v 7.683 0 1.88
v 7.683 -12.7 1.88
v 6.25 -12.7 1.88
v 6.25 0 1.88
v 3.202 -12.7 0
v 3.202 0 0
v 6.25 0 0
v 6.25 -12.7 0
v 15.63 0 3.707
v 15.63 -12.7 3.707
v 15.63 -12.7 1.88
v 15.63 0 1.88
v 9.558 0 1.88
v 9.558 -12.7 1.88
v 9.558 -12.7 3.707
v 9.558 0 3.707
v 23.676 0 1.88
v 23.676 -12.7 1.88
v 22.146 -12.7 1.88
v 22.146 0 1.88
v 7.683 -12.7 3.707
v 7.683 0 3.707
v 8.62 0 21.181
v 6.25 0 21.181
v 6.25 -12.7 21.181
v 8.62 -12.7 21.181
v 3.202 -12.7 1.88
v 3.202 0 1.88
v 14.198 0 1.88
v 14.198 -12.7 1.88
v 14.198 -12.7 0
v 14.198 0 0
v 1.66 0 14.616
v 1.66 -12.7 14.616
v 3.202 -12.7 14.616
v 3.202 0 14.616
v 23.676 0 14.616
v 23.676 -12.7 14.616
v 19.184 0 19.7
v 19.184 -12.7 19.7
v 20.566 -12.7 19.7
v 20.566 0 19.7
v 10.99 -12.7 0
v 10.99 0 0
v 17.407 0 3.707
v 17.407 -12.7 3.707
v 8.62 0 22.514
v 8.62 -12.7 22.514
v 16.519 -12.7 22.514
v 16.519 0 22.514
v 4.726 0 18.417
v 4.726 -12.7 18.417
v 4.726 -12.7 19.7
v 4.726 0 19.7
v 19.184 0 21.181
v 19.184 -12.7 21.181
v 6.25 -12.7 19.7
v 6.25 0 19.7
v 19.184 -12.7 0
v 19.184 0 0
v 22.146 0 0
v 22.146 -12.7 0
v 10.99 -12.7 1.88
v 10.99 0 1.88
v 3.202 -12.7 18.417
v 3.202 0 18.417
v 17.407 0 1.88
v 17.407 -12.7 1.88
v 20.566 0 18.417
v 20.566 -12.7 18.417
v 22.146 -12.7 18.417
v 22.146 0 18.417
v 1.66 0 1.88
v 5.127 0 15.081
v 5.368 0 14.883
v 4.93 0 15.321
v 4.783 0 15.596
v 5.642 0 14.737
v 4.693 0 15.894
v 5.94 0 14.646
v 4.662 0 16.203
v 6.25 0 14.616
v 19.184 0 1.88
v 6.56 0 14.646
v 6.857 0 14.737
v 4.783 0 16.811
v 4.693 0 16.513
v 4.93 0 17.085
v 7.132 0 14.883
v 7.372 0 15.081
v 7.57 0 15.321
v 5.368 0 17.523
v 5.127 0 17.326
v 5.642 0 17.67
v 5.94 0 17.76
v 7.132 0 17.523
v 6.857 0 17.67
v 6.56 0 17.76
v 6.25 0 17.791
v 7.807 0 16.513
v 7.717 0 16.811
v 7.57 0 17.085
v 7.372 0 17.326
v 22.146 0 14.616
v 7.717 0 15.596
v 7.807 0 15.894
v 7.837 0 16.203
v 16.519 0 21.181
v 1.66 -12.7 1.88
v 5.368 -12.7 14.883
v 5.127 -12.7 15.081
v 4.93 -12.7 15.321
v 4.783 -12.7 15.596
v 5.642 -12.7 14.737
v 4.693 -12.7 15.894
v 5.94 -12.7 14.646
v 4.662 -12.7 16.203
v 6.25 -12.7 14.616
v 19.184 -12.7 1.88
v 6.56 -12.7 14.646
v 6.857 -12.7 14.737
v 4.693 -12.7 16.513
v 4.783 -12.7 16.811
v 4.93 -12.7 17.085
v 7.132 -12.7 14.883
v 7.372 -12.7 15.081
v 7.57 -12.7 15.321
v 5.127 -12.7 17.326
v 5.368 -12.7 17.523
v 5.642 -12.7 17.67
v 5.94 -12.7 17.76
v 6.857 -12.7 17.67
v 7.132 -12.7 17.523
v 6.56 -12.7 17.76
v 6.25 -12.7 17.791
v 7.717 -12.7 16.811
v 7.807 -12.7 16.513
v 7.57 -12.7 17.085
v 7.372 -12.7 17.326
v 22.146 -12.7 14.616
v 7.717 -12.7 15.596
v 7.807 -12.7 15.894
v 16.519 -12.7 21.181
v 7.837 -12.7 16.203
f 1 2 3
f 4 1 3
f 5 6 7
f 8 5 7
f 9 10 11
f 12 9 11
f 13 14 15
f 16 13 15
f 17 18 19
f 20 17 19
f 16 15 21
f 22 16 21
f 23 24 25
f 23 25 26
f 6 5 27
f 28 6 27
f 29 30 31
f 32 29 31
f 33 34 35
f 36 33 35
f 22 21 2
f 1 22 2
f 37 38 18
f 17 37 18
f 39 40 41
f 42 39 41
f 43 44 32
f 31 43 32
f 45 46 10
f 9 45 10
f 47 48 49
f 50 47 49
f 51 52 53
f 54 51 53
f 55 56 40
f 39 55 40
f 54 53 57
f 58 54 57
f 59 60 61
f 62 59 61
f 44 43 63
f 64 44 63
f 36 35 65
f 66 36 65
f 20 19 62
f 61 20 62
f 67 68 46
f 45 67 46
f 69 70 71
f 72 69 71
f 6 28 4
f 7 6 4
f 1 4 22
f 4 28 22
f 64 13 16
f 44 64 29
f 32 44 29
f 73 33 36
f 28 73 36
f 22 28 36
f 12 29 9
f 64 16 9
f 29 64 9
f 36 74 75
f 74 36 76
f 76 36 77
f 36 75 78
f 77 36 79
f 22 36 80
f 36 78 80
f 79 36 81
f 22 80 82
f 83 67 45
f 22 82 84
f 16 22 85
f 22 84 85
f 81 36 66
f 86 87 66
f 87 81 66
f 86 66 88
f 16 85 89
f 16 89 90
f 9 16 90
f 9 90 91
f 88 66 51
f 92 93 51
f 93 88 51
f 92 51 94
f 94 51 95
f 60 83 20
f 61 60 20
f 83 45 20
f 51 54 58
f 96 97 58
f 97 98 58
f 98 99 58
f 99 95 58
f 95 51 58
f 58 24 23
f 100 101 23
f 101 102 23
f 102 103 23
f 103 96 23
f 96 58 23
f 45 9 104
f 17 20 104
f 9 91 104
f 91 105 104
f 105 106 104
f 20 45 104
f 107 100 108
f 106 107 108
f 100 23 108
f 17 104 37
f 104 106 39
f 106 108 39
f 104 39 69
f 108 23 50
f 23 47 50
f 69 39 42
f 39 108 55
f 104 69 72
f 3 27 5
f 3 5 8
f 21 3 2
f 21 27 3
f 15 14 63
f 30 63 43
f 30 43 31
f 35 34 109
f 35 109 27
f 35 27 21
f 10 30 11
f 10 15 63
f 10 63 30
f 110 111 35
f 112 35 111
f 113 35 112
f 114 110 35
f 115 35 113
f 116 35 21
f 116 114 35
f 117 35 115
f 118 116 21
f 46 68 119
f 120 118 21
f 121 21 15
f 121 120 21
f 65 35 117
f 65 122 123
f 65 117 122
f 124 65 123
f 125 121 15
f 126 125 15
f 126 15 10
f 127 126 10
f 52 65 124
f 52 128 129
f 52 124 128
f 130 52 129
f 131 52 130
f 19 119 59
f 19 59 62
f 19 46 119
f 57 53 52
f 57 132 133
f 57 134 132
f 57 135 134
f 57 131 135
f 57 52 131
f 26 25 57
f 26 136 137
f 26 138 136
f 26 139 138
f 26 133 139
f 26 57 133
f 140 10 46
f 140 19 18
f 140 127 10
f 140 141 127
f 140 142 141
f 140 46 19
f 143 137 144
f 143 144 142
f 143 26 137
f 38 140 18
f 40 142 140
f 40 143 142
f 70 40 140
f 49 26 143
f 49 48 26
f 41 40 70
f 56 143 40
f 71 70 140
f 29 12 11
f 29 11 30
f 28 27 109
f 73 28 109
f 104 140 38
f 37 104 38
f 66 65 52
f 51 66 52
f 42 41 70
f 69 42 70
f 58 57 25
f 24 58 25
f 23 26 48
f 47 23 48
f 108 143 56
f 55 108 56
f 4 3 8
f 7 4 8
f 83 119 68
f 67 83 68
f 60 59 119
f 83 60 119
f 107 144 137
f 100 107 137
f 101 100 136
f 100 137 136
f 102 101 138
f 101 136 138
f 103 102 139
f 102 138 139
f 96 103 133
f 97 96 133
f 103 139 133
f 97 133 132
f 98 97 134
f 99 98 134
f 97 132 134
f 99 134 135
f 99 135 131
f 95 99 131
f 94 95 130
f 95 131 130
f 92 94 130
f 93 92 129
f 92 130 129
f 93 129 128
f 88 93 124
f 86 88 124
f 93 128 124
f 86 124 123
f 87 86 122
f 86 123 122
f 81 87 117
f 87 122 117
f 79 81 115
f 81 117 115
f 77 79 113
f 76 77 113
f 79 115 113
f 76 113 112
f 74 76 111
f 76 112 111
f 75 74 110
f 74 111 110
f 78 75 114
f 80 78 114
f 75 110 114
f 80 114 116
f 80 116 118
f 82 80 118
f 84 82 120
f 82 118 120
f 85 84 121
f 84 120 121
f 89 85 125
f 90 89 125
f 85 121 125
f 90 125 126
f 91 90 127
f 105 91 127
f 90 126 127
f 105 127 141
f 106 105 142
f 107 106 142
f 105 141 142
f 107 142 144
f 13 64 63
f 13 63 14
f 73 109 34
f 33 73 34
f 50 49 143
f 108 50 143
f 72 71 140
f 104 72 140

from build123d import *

# Parameters (mm, degrees)
F0_W     = 25.4
F0_H     = 25.4
F1_DEPTH = 12.7
F3_DEPTH = 12.7
F4_R     = 1.5875
F5_DEPTH = 12.7


with BuildPart() as f1:
    # F0 (on Front) → F1 (new body)
    with BuildSketch(Plane.XZ):
        with Locations((12.7, 12.7)):
            Rectangle(F0_W, F0_H)
    extrude(amount=F1_DEPTH)

    # F2 (on face) → F3 (cut)
    with BuildSketch(Plane.XZ.offset(12.7)):
        Polygon((0, 0), (3.20243, 0), (3.20243, 1.880125), (1.660184, 1.880125), (1.660184, 14.615892), (3.20243, 14.615892), (3.20243, 18.416876), (4.726184, 18.416876), (4.726184, 19.700326), (6.249938, 19.700326), (6.249938, 21.18123), (8.620429, 21.18123), (8.620429, 22.514043), (16.518579, 22.514043), (16.518579, 21.18123), (19.184204, 21.18123), (19.184204, 19.700326), (20.566382, 19.700326), (20.566382, 18.416876), (22.146011, 18.416876), (22.146011, 14.615892), (23.676278, 14.615892), (23.676278, 1.880125), (22.146011, 1.880125), (22.146011, 0), (25.4, 0), (25.4, 25.4), (0, 25.4), align=None)
        Polygon((14.198497, 1.880125), (14.198497, 0), (19.184204, 0), (19.184204, 1.880125), (17.407121, 1.880125), (17.407121, 3.706572), (15.630037, 3.706572), (15.630037, 1.880125), align=None)
        Polygon((6.249938, 1.880125), (6.249938, 0), (10.989874, 0), (10.989874, 1.880125), (9.558334, 1.880125), (9.558334, 3.706572), (7.682523, 3.706572), (7.682523, 1.880125), align=None)
    extrude(amount=-F3_DEPTH, mode=Mode.SUBTRACT)

    # F4 (on face) → F5 (cut)
    with BuildSketch(Plane.XZ.offset(12.7)):
        with Locations((6.249938, 16.203392)):
            Circle(F4_R)
    extrude(amount=-F5_DEPTH, mode=Mode.SUBTRACT)


solid = f1.part
